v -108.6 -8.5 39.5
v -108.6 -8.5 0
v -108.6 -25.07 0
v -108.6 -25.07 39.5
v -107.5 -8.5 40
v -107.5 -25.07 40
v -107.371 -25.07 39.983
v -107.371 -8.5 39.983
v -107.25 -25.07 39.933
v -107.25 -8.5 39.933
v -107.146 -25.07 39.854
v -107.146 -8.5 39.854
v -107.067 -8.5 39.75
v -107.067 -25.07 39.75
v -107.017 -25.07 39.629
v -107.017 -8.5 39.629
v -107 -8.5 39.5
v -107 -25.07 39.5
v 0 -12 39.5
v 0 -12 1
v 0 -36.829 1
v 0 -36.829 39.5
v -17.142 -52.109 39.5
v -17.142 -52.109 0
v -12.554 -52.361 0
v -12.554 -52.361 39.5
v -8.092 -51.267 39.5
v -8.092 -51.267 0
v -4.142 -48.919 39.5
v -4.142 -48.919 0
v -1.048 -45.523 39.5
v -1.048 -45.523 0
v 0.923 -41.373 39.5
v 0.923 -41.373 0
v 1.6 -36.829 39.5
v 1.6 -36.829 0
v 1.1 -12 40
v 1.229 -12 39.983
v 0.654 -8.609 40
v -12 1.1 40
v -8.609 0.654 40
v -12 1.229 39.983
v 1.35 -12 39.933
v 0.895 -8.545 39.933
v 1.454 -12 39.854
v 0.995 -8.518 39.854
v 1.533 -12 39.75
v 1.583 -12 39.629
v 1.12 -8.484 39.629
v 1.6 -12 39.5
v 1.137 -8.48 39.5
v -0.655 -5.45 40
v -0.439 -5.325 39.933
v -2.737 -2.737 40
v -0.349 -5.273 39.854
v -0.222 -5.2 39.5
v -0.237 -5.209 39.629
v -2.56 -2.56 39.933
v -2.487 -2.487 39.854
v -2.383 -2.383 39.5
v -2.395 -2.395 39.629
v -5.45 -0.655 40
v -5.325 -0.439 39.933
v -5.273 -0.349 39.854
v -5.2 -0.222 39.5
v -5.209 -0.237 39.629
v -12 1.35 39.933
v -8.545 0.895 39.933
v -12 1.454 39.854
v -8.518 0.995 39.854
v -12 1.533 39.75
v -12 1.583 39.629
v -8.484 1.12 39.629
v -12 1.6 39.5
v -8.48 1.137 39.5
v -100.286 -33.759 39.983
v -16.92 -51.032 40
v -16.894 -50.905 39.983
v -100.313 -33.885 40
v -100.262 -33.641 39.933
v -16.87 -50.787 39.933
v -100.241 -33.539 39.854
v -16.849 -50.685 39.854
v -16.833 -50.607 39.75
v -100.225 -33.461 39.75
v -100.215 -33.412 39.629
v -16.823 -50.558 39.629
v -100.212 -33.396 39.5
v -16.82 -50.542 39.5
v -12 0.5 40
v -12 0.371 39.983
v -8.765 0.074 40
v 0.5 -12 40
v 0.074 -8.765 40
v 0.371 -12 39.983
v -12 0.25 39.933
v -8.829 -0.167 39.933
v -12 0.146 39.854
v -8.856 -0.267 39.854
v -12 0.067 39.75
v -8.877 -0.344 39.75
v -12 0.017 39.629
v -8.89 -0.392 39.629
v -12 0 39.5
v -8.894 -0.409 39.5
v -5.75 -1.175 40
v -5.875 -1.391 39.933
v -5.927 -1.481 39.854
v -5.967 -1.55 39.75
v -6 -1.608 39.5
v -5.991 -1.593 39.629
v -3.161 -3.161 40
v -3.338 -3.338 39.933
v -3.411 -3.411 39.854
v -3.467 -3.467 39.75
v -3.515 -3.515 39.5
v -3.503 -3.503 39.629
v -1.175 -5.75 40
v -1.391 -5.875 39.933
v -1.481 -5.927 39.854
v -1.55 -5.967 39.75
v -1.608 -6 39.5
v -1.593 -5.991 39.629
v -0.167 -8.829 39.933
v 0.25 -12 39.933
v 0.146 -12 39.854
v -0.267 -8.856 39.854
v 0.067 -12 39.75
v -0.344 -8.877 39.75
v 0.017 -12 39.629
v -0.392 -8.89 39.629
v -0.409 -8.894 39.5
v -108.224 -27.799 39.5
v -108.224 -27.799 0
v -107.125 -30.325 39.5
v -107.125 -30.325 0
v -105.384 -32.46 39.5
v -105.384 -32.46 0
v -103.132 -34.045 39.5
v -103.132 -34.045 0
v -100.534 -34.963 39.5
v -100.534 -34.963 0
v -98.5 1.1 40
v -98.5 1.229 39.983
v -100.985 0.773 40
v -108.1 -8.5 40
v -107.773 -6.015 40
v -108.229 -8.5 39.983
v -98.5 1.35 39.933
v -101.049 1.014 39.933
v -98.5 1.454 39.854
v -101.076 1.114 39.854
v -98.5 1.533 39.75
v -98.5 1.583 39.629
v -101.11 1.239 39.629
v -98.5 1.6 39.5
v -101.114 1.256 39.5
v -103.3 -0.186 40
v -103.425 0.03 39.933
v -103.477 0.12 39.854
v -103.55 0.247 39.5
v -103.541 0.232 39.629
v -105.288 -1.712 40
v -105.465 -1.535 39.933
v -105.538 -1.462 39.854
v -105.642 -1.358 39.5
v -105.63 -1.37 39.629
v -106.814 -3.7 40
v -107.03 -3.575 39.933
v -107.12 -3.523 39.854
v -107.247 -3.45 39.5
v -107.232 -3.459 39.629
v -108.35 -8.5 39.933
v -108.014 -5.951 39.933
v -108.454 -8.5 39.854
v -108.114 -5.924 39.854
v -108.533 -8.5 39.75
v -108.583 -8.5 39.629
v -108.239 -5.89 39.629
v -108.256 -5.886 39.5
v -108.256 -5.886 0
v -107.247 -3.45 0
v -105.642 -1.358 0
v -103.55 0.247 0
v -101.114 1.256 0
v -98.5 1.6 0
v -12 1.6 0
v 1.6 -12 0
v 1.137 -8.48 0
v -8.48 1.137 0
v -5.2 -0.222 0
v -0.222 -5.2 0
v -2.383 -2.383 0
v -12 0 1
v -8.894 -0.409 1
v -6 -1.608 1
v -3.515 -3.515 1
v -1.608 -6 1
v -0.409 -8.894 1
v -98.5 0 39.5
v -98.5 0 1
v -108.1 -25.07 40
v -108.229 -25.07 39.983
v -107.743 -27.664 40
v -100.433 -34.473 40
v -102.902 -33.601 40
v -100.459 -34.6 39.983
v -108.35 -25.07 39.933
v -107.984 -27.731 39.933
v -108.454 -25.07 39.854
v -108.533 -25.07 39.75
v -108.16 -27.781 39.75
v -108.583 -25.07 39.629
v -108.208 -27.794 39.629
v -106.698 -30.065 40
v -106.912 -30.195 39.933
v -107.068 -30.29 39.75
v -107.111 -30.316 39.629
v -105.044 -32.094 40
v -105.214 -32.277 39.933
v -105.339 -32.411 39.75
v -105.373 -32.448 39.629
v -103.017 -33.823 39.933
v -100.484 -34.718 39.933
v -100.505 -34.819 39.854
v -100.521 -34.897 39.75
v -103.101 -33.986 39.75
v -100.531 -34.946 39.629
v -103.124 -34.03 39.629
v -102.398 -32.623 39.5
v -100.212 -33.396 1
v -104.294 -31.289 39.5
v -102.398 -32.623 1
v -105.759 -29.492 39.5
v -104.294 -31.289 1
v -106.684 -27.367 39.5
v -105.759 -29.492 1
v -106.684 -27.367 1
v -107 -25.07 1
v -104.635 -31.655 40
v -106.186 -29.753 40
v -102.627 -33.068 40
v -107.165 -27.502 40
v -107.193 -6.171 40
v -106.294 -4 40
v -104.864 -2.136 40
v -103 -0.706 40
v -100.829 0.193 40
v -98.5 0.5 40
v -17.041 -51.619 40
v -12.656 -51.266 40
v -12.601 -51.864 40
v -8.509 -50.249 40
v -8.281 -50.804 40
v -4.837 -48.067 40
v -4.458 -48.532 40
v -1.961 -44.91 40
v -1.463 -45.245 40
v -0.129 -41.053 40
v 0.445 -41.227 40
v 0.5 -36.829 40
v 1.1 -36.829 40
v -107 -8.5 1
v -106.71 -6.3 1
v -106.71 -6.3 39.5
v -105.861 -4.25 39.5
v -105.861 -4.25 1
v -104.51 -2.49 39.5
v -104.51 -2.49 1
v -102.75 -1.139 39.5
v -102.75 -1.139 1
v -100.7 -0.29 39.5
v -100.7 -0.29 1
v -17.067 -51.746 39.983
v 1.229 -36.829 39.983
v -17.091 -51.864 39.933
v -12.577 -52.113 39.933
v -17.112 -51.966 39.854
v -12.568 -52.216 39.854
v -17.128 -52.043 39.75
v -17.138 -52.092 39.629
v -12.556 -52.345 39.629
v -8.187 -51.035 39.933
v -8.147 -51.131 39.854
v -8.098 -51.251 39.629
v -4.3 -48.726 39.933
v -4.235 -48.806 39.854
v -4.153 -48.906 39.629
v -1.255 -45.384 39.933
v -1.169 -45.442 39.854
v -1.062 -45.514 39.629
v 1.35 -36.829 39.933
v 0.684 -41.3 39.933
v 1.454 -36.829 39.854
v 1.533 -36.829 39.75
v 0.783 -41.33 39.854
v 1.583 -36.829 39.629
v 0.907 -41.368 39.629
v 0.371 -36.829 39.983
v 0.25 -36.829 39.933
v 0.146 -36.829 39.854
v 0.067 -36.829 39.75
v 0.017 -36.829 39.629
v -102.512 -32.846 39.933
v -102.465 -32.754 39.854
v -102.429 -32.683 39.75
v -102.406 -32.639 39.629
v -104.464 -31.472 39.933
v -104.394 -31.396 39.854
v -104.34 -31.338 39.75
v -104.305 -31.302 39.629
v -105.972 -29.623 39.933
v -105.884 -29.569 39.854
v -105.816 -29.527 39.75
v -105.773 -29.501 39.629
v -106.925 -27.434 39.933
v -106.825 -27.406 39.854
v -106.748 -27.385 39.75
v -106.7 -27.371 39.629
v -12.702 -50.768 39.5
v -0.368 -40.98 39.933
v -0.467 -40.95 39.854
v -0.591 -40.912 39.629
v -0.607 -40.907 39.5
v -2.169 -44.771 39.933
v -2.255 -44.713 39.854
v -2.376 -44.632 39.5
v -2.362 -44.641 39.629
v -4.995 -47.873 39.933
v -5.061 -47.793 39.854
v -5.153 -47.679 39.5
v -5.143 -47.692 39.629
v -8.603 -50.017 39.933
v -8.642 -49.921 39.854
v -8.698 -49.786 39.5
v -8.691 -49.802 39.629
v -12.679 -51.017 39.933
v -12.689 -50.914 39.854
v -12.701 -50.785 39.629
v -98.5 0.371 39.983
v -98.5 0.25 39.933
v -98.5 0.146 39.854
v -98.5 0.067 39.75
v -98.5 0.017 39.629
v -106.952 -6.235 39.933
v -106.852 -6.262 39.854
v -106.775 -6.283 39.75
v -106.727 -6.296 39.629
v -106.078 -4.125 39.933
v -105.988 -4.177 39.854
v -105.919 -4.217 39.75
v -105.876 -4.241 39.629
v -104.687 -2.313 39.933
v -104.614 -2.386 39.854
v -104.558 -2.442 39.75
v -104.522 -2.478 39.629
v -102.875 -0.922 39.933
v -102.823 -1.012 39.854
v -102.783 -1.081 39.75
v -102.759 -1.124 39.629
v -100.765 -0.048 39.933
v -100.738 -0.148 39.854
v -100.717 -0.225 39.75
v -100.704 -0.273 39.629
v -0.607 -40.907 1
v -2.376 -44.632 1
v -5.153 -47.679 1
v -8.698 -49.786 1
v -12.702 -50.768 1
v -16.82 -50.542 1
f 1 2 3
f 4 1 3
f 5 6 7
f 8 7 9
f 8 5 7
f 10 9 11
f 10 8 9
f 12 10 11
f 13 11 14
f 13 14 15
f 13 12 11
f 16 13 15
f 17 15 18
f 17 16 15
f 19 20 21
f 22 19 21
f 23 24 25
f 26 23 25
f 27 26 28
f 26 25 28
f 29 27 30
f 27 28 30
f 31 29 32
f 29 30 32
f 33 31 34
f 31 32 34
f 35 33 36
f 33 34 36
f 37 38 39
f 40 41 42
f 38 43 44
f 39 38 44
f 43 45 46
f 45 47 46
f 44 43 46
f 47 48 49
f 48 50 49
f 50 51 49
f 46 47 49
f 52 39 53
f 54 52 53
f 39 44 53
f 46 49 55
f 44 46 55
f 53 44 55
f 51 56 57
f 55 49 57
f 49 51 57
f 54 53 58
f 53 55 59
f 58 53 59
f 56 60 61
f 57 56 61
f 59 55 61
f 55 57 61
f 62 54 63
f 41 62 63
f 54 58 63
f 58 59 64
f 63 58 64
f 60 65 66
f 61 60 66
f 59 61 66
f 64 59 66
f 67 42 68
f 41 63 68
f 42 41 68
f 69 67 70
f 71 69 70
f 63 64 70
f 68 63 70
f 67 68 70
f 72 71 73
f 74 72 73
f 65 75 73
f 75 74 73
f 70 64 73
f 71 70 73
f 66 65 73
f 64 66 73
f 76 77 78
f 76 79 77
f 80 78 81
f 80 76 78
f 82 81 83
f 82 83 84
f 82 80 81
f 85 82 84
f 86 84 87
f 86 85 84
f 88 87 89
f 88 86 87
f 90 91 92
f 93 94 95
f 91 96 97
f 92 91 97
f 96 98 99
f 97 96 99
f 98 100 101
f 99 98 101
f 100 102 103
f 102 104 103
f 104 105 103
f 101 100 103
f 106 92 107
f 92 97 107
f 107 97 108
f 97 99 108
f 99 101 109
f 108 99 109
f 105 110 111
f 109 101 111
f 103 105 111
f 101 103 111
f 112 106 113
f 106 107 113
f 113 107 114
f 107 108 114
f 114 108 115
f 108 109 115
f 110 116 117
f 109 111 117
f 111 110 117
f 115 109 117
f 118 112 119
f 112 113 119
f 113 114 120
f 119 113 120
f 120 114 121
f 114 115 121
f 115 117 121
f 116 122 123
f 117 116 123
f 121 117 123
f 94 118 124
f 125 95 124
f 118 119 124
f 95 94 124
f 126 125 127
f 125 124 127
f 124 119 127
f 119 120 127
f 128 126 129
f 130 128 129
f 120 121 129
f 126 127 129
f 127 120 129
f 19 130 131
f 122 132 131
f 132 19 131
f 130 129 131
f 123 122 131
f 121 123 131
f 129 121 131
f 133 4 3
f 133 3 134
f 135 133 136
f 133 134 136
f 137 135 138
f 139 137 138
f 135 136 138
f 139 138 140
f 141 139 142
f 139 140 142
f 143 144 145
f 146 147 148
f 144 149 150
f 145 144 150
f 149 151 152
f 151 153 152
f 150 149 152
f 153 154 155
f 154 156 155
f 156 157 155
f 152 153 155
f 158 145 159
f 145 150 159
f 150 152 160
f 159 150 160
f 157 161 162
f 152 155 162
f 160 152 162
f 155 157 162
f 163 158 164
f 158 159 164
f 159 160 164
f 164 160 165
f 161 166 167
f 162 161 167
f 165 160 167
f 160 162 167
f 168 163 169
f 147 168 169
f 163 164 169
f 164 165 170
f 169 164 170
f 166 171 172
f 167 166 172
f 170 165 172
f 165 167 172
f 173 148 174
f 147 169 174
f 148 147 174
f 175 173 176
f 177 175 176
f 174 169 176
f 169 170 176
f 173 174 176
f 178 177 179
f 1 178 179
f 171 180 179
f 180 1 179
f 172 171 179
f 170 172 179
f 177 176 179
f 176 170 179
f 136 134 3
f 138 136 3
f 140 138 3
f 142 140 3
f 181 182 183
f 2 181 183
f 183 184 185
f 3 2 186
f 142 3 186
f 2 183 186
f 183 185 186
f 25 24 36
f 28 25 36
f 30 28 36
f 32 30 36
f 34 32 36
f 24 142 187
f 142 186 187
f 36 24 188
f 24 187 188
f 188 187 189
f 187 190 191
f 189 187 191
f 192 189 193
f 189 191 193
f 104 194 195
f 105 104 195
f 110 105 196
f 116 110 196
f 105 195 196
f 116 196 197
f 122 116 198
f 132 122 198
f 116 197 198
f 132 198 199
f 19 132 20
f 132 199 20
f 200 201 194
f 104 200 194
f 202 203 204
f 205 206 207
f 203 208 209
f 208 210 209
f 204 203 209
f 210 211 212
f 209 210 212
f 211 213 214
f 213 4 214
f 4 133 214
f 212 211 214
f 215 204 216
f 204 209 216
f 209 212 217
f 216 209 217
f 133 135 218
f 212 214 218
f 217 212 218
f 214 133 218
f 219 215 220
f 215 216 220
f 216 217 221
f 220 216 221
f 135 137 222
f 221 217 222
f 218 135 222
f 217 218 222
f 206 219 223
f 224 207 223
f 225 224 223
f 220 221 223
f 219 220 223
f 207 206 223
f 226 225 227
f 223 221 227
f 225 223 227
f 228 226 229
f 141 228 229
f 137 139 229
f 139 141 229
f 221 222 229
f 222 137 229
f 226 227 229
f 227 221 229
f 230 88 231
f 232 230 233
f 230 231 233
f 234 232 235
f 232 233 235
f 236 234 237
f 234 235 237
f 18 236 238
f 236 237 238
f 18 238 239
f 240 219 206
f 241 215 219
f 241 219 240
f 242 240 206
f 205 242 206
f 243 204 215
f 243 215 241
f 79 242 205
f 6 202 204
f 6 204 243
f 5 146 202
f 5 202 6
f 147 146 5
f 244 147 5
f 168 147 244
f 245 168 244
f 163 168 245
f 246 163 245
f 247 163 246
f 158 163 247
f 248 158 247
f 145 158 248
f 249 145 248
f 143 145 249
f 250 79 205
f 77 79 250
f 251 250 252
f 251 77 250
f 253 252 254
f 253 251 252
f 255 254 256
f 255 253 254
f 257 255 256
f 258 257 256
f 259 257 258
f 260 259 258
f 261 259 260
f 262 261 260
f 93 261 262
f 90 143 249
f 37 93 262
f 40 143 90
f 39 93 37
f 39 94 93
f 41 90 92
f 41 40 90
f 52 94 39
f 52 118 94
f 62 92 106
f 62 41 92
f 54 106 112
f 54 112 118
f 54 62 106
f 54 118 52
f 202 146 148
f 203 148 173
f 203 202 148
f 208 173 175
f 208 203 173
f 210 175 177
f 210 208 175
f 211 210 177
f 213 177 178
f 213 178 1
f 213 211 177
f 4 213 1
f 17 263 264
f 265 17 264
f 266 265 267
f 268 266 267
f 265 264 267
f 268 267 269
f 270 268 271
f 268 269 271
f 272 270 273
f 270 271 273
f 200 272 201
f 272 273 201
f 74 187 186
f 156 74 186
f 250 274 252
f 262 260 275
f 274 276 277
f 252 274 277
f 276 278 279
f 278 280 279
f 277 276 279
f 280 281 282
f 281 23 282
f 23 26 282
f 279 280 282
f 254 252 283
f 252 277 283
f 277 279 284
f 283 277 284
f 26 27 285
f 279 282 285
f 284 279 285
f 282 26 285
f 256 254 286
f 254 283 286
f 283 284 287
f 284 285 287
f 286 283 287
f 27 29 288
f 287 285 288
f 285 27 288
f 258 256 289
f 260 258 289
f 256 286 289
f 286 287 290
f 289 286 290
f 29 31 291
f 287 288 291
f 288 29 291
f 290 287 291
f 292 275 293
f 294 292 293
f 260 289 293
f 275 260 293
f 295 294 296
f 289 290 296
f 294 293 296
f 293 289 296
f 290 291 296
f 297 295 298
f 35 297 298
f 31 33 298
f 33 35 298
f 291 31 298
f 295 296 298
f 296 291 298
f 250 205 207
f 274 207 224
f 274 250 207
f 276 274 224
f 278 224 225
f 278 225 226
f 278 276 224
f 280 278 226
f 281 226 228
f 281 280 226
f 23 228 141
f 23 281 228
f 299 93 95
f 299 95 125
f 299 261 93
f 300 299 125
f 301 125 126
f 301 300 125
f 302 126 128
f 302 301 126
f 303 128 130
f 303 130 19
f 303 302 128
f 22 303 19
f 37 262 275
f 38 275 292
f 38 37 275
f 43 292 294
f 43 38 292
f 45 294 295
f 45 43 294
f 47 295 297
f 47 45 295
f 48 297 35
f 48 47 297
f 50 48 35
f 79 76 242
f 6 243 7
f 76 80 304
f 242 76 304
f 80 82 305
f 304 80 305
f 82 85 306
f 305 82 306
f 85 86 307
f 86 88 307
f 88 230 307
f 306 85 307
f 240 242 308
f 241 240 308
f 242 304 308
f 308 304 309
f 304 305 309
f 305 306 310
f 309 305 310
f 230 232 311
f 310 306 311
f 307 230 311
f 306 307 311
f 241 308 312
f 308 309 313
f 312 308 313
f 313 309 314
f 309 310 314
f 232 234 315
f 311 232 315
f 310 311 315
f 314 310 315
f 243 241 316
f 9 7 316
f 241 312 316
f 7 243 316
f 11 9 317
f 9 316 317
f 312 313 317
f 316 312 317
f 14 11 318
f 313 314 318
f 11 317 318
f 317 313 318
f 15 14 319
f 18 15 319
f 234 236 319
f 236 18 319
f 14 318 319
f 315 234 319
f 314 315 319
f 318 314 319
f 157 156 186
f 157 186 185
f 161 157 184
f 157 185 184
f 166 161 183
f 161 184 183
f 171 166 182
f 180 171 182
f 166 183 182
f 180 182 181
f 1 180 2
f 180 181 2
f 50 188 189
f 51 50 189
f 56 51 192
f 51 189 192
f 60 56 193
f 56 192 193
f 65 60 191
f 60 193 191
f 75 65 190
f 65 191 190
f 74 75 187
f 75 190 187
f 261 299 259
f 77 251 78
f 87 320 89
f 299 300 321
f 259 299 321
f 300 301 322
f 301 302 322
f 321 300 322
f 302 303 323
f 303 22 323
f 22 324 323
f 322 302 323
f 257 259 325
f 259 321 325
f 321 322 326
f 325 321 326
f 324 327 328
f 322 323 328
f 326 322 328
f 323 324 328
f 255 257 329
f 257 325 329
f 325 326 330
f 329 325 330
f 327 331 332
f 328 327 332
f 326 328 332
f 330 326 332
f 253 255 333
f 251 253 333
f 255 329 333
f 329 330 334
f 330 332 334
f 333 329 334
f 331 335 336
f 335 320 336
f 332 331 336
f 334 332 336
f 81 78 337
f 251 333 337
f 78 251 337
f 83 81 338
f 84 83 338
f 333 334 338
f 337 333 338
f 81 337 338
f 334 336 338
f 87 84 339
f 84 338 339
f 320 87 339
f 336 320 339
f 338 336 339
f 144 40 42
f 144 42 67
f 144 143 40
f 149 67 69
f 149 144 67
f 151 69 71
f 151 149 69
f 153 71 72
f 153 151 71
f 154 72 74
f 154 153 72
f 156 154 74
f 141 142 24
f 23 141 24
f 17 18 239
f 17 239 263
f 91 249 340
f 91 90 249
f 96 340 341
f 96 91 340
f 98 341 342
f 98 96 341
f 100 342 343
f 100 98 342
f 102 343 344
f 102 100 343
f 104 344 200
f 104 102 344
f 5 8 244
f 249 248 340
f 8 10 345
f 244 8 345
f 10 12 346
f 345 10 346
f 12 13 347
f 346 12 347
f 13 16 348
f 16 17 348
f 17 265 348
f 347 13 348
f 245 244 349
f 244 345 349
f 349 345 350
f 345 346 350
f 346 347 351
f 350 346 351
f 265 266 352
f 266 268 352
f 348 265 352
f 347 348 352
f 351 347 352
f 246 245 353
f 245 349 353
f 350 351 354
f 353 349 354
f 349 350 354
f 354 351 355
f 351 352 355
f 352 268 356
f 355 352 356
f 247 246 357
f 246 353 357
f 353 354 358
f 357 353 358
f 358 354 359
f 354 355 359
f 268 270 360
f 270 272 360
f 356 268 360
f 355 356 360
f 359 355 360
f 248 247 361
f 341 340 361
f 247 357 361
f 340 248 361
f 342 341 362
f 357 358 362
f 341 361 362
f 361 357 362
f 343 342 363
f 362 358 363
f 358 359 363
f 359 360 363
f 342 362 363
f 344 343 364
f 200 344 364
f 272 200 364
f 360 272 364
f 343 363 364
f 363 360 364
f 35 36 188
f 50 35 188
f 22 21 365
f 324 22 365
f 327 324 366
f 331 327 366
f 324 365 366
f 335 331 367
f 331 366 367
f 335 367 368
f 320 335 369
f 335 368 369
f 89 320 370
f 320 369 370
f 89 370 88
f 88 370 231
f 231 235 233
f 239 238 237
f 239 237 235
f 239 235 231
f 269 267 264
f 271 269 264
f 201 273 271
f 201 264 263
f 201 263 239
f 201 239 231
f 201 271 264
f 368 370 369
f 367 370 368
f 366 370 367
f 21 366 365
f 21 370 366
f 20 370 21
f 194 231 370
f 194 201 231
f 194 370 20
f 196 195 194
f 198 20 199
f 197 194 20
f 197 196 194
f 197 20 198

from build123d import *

# Parameters (mm, degrees)
F1_DEPTH = 1
F2_DEPTH = 40
F3_R     = 0.5


with BuildPart() as f1:
    # F0 (on Top) → F1 (new body)
    with BuildSketch(Plane.XY):
        with BuildLine():
            ThreePointArc((0, -12), (-3.514719, -3.514719), (-12, 0))
            Line((-12, 0), (-98.5, 0))
            ThreePointArc((-98.5, 0), (-104.510408, -2.489592), (-107, -8.5))
            Line((-107, -8.5), (-107, -25.069857))
            ThreePointArc((-107, -25.069857), (-105.087897, -30.441041), (-100.211854, -33.395694))
            Line((-100.211854, -33.395694), (-16.819525, -50.54178))
            ThreePointArc((-16.819525, -50.54178), (-5.153344, -47.67929), (0, -36.828637))
            Line((0, -36.828637), (0, -12))
        make_face()
    extrude(amount=F1_DEPTH)

    # F0 (on Top) → F2 (join)
    with BuildSketch(Plane.XY):
        with BuildLine():
            Line((1.6, -36.828637), (1.6, -12))
            ThreePointArc((1.6, -12), (-2.383348, -2.383348), (-12, 1.6))
            Line((-12, 1.6), (-98.5, 1.6))
            ThreePointArc((-98.5, 1.6), (-105.641778, -1.358222), (-108.6, -8.5))
            Line((-108.6, -8.5), (-108.6, -25.069857))
            ThreePointArc((-108.6, -25.069857), (-106.327971, -31.452088), (-100.534086, -34.96291))
            Line((-100.534086, -34.96291), (-17.141756, -52.108996))
            ThreePointArc((-17.141756, -52.108996), (-4.142297, -48.919365), (1.6, -36.828637))
        make_face()
        with BuildLine():
            Line((-98.5, 0), (-12, 0))
            ThreePointArc((-12, 0), (-3.514719, -3.514719), (0, -12))
            Line((0, -12), (0, -36.828637))
            ThreePointArc((0, -36.828637), (-5.153344, -47.67929), (-16.819525, -50.54178))
            Line((-16.819525, -50.54178), (-100.211854, -33.395694))
            ThreePointArc((-100.211854, -33.395694), (-105.087897, -30.441041), (-107, -25.069857))
            Line((-107, -25.069857), (-107, -8.5))
            ThreePointArc((-107, -8.5), (-104.510408, -2.489592), (-98.5, 0))
        make_face(mode=Mode.SUBTRACT)
    extrude(amount=F2_DEPTH)

    # F3
    f3_edges = [f1.edges().sort_by_distance(p)[0] for p in [
        (-58.837921, -43.535953, 40),
        (-58.515689, -41.968737, 40),
    ]]
    fillet(f3_edges, radius=F3_R)


solid = f1.part
